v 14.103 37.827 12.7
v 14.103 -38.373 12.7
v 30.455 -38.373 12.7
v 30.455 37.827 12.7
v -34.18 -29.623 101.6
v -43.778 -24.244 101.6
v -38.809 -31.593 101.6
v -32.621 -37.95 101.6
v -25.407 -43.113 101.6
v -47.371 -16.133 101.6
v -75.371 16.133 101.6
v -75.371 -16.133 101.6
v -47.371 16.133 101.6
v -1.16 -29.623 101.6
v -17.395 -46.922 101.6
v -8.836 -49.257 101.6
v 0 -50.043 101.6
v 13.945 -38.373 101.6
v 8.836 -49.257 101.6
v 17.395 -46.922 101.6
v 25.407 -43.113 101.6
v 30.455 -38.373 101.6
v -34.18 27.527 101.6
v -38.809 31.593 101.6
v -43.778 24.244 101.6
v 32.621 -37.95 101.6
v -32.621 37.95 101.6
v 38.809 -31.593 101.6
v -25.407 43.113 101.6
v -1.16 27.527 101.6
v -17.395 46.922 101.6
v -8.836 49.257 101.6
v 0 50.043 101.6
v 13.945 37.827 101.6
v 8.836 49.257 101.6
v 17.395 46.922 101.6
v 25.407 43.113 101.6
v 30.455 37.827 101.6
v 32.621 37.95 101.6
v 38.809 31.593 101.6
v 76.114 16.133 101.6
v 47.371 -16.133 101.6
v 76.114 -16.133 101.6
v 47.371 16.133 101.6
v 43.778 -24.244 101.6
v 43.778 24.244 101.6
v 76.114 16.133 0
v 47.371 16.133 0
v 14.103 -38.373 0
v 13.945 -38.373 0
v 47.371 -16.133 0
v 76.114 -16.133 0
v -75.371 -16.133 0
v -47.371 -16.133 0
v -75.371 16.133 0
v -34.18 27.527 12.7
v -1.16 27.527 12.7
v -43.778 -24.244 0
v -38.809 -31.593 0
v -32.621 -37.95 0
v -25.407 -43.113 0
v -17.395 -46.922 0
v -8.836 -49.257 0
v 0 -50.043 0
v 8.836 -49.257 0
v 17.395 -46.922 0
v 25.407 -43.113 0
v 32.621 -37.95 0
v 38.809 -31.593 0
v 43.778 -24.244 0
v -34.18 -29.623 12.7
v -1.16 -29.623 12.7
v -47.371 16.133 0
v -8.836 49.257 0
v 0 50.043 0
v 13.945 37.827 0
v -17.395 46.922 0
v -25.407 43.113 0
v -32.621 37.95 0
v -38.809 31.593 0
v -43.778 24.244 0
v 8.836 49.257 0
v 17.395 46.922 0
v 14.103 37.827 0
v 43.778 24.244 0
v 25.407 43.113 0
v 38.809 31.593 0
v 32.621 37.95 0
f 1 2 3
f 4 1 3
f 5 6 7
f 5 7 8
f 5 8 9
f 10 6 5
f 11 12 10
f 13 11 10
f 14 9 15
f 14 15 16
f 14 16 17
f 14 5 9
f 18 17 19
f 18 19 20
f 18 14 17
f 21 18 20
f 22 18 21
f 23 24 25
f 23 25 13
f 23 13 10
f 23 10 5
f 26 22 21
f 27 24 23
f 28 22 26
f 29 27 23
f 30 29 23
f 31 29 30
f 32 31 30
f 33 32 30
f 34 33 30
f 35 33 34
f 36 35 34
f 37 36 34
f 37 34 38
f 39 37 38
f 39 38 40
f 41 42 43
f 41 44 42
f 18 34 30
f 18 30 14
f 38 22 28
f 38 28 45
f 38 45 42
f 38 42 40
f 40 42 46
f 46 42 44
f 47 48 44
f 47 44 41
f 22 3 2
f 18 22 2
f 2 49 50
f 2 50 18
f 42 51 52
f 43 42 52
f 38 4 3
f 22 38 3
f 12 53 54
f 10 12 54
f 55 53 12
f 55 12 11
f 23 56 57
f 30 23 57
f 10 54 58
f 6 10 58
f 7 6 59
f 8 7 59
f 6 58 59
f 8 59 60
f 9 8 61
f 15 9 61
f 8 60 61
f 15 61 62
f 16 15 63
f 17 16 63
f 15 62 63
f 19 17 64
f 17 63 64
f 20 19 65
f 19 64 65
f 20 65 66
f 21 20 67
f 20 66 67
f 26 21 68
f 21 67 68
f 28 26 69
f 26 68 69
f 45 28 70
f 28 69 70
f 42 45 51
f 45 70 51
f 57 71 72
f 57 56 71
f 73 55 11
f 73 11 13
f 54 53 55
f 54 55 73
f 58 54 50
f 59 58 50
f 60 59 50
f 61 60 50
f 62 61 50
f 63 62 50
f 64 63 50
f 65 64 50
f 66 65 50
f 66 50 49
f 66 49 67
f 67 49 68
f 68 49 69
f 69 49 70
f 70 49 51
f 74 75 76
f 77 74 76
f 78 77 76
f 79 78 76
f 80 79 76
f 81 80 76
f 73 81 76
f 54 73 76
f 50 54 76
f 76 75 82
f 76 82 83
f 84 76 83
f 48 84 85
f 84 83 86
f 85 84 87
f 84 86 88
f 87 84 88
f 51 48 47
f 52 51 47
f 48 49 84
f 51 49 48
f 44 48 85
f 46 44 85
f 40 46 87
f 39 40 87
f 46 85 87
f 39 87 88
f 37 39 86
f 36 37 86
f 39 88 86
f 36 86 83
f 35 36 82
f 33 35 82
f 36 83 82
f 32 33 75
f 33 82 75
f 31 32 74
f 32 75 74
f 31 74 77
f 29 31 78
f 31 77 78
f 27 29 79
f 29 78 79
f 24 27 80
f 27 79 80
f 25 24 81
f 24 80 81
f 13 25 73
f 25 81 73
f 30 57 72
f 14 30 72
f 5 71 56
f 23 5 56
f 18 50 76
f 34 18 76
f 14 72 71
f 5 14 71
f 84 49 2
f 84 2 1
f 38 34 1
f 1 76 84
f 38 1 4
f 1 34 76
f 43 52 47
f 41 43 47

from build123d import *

# Parameters (mm, degrees)
F0_W     = 28.0003916717
F0_H     = 32.2663935487
F0_W_2   = 28.7430296161
F1_DEPTH = 101.6
F2_W     = 34.6587272506
F2_H     = 58.0717623234
F2_W_2   = 16.9384283945
F2_H_2   = 77.3962959647
F3_DEPTH = 12.7


# Not quite as in the source:
# - a feature names something its author has since deleted; it is built from what else it names


with BuildPart() as f1:
    # F0 (on Top) → F1 (new body)
    with BuildSketch(Plane.XY):
        with BuildLine():
            Line((-47.371, 16.1331967744), (-47.371, -16.1331967744))
            ThreePointArc((-47.371, -16.1331967744), (0, -50.0428983889), (47.371, -16.1331967744))
            Line((47.371, -16.1331967744), (47.371, 16.1331967744))
            ThreePointArc((47.371, 16.1331967744), (0, 50.0428983889), (-47.371, 16.1331967744))
        make_face()
        Polygon((-34.1799231236, -29.6225996721), (-34.1799231236, 27.5274003279), (-1.1599231236, 27.5274003279), (-1.1599231236, -29.6225996721), (-8.1120360752, -29.6225996721), align=None, mode=Mode.SUBTRACT)
        Polygon((13.945407662, -38.3726616568), (13.945407662, 37.8273383432), (30.455407662, 37.8273383432), (30.455407662, -38.3726616568), (18.8453282475, -38.3726616568), align=None, mode=Mode.SUBTRACT)
        with Locations((-61.3711958359, 0)):
            Rectangle(F0_W, F0_H)
        with Locations((61.7425148081, 0)):
            Rectangle(F0_W_2, F0_H)
    extrude(amount=F1_DEPTH)

    # F2 (on Top) → F3 (join)
    with BuildSketch(Plane.XY):
        with Locations((-17.2371207664, -0.9217876941)):
            Rectangle(F2_W, F2_H)
        with Locations((22.572400514, -0.1084208488)):
            Rectangle(F2_W_2, F2_H_2)
    extrude(amount=F3_DEPTH)


solid = f1.part
